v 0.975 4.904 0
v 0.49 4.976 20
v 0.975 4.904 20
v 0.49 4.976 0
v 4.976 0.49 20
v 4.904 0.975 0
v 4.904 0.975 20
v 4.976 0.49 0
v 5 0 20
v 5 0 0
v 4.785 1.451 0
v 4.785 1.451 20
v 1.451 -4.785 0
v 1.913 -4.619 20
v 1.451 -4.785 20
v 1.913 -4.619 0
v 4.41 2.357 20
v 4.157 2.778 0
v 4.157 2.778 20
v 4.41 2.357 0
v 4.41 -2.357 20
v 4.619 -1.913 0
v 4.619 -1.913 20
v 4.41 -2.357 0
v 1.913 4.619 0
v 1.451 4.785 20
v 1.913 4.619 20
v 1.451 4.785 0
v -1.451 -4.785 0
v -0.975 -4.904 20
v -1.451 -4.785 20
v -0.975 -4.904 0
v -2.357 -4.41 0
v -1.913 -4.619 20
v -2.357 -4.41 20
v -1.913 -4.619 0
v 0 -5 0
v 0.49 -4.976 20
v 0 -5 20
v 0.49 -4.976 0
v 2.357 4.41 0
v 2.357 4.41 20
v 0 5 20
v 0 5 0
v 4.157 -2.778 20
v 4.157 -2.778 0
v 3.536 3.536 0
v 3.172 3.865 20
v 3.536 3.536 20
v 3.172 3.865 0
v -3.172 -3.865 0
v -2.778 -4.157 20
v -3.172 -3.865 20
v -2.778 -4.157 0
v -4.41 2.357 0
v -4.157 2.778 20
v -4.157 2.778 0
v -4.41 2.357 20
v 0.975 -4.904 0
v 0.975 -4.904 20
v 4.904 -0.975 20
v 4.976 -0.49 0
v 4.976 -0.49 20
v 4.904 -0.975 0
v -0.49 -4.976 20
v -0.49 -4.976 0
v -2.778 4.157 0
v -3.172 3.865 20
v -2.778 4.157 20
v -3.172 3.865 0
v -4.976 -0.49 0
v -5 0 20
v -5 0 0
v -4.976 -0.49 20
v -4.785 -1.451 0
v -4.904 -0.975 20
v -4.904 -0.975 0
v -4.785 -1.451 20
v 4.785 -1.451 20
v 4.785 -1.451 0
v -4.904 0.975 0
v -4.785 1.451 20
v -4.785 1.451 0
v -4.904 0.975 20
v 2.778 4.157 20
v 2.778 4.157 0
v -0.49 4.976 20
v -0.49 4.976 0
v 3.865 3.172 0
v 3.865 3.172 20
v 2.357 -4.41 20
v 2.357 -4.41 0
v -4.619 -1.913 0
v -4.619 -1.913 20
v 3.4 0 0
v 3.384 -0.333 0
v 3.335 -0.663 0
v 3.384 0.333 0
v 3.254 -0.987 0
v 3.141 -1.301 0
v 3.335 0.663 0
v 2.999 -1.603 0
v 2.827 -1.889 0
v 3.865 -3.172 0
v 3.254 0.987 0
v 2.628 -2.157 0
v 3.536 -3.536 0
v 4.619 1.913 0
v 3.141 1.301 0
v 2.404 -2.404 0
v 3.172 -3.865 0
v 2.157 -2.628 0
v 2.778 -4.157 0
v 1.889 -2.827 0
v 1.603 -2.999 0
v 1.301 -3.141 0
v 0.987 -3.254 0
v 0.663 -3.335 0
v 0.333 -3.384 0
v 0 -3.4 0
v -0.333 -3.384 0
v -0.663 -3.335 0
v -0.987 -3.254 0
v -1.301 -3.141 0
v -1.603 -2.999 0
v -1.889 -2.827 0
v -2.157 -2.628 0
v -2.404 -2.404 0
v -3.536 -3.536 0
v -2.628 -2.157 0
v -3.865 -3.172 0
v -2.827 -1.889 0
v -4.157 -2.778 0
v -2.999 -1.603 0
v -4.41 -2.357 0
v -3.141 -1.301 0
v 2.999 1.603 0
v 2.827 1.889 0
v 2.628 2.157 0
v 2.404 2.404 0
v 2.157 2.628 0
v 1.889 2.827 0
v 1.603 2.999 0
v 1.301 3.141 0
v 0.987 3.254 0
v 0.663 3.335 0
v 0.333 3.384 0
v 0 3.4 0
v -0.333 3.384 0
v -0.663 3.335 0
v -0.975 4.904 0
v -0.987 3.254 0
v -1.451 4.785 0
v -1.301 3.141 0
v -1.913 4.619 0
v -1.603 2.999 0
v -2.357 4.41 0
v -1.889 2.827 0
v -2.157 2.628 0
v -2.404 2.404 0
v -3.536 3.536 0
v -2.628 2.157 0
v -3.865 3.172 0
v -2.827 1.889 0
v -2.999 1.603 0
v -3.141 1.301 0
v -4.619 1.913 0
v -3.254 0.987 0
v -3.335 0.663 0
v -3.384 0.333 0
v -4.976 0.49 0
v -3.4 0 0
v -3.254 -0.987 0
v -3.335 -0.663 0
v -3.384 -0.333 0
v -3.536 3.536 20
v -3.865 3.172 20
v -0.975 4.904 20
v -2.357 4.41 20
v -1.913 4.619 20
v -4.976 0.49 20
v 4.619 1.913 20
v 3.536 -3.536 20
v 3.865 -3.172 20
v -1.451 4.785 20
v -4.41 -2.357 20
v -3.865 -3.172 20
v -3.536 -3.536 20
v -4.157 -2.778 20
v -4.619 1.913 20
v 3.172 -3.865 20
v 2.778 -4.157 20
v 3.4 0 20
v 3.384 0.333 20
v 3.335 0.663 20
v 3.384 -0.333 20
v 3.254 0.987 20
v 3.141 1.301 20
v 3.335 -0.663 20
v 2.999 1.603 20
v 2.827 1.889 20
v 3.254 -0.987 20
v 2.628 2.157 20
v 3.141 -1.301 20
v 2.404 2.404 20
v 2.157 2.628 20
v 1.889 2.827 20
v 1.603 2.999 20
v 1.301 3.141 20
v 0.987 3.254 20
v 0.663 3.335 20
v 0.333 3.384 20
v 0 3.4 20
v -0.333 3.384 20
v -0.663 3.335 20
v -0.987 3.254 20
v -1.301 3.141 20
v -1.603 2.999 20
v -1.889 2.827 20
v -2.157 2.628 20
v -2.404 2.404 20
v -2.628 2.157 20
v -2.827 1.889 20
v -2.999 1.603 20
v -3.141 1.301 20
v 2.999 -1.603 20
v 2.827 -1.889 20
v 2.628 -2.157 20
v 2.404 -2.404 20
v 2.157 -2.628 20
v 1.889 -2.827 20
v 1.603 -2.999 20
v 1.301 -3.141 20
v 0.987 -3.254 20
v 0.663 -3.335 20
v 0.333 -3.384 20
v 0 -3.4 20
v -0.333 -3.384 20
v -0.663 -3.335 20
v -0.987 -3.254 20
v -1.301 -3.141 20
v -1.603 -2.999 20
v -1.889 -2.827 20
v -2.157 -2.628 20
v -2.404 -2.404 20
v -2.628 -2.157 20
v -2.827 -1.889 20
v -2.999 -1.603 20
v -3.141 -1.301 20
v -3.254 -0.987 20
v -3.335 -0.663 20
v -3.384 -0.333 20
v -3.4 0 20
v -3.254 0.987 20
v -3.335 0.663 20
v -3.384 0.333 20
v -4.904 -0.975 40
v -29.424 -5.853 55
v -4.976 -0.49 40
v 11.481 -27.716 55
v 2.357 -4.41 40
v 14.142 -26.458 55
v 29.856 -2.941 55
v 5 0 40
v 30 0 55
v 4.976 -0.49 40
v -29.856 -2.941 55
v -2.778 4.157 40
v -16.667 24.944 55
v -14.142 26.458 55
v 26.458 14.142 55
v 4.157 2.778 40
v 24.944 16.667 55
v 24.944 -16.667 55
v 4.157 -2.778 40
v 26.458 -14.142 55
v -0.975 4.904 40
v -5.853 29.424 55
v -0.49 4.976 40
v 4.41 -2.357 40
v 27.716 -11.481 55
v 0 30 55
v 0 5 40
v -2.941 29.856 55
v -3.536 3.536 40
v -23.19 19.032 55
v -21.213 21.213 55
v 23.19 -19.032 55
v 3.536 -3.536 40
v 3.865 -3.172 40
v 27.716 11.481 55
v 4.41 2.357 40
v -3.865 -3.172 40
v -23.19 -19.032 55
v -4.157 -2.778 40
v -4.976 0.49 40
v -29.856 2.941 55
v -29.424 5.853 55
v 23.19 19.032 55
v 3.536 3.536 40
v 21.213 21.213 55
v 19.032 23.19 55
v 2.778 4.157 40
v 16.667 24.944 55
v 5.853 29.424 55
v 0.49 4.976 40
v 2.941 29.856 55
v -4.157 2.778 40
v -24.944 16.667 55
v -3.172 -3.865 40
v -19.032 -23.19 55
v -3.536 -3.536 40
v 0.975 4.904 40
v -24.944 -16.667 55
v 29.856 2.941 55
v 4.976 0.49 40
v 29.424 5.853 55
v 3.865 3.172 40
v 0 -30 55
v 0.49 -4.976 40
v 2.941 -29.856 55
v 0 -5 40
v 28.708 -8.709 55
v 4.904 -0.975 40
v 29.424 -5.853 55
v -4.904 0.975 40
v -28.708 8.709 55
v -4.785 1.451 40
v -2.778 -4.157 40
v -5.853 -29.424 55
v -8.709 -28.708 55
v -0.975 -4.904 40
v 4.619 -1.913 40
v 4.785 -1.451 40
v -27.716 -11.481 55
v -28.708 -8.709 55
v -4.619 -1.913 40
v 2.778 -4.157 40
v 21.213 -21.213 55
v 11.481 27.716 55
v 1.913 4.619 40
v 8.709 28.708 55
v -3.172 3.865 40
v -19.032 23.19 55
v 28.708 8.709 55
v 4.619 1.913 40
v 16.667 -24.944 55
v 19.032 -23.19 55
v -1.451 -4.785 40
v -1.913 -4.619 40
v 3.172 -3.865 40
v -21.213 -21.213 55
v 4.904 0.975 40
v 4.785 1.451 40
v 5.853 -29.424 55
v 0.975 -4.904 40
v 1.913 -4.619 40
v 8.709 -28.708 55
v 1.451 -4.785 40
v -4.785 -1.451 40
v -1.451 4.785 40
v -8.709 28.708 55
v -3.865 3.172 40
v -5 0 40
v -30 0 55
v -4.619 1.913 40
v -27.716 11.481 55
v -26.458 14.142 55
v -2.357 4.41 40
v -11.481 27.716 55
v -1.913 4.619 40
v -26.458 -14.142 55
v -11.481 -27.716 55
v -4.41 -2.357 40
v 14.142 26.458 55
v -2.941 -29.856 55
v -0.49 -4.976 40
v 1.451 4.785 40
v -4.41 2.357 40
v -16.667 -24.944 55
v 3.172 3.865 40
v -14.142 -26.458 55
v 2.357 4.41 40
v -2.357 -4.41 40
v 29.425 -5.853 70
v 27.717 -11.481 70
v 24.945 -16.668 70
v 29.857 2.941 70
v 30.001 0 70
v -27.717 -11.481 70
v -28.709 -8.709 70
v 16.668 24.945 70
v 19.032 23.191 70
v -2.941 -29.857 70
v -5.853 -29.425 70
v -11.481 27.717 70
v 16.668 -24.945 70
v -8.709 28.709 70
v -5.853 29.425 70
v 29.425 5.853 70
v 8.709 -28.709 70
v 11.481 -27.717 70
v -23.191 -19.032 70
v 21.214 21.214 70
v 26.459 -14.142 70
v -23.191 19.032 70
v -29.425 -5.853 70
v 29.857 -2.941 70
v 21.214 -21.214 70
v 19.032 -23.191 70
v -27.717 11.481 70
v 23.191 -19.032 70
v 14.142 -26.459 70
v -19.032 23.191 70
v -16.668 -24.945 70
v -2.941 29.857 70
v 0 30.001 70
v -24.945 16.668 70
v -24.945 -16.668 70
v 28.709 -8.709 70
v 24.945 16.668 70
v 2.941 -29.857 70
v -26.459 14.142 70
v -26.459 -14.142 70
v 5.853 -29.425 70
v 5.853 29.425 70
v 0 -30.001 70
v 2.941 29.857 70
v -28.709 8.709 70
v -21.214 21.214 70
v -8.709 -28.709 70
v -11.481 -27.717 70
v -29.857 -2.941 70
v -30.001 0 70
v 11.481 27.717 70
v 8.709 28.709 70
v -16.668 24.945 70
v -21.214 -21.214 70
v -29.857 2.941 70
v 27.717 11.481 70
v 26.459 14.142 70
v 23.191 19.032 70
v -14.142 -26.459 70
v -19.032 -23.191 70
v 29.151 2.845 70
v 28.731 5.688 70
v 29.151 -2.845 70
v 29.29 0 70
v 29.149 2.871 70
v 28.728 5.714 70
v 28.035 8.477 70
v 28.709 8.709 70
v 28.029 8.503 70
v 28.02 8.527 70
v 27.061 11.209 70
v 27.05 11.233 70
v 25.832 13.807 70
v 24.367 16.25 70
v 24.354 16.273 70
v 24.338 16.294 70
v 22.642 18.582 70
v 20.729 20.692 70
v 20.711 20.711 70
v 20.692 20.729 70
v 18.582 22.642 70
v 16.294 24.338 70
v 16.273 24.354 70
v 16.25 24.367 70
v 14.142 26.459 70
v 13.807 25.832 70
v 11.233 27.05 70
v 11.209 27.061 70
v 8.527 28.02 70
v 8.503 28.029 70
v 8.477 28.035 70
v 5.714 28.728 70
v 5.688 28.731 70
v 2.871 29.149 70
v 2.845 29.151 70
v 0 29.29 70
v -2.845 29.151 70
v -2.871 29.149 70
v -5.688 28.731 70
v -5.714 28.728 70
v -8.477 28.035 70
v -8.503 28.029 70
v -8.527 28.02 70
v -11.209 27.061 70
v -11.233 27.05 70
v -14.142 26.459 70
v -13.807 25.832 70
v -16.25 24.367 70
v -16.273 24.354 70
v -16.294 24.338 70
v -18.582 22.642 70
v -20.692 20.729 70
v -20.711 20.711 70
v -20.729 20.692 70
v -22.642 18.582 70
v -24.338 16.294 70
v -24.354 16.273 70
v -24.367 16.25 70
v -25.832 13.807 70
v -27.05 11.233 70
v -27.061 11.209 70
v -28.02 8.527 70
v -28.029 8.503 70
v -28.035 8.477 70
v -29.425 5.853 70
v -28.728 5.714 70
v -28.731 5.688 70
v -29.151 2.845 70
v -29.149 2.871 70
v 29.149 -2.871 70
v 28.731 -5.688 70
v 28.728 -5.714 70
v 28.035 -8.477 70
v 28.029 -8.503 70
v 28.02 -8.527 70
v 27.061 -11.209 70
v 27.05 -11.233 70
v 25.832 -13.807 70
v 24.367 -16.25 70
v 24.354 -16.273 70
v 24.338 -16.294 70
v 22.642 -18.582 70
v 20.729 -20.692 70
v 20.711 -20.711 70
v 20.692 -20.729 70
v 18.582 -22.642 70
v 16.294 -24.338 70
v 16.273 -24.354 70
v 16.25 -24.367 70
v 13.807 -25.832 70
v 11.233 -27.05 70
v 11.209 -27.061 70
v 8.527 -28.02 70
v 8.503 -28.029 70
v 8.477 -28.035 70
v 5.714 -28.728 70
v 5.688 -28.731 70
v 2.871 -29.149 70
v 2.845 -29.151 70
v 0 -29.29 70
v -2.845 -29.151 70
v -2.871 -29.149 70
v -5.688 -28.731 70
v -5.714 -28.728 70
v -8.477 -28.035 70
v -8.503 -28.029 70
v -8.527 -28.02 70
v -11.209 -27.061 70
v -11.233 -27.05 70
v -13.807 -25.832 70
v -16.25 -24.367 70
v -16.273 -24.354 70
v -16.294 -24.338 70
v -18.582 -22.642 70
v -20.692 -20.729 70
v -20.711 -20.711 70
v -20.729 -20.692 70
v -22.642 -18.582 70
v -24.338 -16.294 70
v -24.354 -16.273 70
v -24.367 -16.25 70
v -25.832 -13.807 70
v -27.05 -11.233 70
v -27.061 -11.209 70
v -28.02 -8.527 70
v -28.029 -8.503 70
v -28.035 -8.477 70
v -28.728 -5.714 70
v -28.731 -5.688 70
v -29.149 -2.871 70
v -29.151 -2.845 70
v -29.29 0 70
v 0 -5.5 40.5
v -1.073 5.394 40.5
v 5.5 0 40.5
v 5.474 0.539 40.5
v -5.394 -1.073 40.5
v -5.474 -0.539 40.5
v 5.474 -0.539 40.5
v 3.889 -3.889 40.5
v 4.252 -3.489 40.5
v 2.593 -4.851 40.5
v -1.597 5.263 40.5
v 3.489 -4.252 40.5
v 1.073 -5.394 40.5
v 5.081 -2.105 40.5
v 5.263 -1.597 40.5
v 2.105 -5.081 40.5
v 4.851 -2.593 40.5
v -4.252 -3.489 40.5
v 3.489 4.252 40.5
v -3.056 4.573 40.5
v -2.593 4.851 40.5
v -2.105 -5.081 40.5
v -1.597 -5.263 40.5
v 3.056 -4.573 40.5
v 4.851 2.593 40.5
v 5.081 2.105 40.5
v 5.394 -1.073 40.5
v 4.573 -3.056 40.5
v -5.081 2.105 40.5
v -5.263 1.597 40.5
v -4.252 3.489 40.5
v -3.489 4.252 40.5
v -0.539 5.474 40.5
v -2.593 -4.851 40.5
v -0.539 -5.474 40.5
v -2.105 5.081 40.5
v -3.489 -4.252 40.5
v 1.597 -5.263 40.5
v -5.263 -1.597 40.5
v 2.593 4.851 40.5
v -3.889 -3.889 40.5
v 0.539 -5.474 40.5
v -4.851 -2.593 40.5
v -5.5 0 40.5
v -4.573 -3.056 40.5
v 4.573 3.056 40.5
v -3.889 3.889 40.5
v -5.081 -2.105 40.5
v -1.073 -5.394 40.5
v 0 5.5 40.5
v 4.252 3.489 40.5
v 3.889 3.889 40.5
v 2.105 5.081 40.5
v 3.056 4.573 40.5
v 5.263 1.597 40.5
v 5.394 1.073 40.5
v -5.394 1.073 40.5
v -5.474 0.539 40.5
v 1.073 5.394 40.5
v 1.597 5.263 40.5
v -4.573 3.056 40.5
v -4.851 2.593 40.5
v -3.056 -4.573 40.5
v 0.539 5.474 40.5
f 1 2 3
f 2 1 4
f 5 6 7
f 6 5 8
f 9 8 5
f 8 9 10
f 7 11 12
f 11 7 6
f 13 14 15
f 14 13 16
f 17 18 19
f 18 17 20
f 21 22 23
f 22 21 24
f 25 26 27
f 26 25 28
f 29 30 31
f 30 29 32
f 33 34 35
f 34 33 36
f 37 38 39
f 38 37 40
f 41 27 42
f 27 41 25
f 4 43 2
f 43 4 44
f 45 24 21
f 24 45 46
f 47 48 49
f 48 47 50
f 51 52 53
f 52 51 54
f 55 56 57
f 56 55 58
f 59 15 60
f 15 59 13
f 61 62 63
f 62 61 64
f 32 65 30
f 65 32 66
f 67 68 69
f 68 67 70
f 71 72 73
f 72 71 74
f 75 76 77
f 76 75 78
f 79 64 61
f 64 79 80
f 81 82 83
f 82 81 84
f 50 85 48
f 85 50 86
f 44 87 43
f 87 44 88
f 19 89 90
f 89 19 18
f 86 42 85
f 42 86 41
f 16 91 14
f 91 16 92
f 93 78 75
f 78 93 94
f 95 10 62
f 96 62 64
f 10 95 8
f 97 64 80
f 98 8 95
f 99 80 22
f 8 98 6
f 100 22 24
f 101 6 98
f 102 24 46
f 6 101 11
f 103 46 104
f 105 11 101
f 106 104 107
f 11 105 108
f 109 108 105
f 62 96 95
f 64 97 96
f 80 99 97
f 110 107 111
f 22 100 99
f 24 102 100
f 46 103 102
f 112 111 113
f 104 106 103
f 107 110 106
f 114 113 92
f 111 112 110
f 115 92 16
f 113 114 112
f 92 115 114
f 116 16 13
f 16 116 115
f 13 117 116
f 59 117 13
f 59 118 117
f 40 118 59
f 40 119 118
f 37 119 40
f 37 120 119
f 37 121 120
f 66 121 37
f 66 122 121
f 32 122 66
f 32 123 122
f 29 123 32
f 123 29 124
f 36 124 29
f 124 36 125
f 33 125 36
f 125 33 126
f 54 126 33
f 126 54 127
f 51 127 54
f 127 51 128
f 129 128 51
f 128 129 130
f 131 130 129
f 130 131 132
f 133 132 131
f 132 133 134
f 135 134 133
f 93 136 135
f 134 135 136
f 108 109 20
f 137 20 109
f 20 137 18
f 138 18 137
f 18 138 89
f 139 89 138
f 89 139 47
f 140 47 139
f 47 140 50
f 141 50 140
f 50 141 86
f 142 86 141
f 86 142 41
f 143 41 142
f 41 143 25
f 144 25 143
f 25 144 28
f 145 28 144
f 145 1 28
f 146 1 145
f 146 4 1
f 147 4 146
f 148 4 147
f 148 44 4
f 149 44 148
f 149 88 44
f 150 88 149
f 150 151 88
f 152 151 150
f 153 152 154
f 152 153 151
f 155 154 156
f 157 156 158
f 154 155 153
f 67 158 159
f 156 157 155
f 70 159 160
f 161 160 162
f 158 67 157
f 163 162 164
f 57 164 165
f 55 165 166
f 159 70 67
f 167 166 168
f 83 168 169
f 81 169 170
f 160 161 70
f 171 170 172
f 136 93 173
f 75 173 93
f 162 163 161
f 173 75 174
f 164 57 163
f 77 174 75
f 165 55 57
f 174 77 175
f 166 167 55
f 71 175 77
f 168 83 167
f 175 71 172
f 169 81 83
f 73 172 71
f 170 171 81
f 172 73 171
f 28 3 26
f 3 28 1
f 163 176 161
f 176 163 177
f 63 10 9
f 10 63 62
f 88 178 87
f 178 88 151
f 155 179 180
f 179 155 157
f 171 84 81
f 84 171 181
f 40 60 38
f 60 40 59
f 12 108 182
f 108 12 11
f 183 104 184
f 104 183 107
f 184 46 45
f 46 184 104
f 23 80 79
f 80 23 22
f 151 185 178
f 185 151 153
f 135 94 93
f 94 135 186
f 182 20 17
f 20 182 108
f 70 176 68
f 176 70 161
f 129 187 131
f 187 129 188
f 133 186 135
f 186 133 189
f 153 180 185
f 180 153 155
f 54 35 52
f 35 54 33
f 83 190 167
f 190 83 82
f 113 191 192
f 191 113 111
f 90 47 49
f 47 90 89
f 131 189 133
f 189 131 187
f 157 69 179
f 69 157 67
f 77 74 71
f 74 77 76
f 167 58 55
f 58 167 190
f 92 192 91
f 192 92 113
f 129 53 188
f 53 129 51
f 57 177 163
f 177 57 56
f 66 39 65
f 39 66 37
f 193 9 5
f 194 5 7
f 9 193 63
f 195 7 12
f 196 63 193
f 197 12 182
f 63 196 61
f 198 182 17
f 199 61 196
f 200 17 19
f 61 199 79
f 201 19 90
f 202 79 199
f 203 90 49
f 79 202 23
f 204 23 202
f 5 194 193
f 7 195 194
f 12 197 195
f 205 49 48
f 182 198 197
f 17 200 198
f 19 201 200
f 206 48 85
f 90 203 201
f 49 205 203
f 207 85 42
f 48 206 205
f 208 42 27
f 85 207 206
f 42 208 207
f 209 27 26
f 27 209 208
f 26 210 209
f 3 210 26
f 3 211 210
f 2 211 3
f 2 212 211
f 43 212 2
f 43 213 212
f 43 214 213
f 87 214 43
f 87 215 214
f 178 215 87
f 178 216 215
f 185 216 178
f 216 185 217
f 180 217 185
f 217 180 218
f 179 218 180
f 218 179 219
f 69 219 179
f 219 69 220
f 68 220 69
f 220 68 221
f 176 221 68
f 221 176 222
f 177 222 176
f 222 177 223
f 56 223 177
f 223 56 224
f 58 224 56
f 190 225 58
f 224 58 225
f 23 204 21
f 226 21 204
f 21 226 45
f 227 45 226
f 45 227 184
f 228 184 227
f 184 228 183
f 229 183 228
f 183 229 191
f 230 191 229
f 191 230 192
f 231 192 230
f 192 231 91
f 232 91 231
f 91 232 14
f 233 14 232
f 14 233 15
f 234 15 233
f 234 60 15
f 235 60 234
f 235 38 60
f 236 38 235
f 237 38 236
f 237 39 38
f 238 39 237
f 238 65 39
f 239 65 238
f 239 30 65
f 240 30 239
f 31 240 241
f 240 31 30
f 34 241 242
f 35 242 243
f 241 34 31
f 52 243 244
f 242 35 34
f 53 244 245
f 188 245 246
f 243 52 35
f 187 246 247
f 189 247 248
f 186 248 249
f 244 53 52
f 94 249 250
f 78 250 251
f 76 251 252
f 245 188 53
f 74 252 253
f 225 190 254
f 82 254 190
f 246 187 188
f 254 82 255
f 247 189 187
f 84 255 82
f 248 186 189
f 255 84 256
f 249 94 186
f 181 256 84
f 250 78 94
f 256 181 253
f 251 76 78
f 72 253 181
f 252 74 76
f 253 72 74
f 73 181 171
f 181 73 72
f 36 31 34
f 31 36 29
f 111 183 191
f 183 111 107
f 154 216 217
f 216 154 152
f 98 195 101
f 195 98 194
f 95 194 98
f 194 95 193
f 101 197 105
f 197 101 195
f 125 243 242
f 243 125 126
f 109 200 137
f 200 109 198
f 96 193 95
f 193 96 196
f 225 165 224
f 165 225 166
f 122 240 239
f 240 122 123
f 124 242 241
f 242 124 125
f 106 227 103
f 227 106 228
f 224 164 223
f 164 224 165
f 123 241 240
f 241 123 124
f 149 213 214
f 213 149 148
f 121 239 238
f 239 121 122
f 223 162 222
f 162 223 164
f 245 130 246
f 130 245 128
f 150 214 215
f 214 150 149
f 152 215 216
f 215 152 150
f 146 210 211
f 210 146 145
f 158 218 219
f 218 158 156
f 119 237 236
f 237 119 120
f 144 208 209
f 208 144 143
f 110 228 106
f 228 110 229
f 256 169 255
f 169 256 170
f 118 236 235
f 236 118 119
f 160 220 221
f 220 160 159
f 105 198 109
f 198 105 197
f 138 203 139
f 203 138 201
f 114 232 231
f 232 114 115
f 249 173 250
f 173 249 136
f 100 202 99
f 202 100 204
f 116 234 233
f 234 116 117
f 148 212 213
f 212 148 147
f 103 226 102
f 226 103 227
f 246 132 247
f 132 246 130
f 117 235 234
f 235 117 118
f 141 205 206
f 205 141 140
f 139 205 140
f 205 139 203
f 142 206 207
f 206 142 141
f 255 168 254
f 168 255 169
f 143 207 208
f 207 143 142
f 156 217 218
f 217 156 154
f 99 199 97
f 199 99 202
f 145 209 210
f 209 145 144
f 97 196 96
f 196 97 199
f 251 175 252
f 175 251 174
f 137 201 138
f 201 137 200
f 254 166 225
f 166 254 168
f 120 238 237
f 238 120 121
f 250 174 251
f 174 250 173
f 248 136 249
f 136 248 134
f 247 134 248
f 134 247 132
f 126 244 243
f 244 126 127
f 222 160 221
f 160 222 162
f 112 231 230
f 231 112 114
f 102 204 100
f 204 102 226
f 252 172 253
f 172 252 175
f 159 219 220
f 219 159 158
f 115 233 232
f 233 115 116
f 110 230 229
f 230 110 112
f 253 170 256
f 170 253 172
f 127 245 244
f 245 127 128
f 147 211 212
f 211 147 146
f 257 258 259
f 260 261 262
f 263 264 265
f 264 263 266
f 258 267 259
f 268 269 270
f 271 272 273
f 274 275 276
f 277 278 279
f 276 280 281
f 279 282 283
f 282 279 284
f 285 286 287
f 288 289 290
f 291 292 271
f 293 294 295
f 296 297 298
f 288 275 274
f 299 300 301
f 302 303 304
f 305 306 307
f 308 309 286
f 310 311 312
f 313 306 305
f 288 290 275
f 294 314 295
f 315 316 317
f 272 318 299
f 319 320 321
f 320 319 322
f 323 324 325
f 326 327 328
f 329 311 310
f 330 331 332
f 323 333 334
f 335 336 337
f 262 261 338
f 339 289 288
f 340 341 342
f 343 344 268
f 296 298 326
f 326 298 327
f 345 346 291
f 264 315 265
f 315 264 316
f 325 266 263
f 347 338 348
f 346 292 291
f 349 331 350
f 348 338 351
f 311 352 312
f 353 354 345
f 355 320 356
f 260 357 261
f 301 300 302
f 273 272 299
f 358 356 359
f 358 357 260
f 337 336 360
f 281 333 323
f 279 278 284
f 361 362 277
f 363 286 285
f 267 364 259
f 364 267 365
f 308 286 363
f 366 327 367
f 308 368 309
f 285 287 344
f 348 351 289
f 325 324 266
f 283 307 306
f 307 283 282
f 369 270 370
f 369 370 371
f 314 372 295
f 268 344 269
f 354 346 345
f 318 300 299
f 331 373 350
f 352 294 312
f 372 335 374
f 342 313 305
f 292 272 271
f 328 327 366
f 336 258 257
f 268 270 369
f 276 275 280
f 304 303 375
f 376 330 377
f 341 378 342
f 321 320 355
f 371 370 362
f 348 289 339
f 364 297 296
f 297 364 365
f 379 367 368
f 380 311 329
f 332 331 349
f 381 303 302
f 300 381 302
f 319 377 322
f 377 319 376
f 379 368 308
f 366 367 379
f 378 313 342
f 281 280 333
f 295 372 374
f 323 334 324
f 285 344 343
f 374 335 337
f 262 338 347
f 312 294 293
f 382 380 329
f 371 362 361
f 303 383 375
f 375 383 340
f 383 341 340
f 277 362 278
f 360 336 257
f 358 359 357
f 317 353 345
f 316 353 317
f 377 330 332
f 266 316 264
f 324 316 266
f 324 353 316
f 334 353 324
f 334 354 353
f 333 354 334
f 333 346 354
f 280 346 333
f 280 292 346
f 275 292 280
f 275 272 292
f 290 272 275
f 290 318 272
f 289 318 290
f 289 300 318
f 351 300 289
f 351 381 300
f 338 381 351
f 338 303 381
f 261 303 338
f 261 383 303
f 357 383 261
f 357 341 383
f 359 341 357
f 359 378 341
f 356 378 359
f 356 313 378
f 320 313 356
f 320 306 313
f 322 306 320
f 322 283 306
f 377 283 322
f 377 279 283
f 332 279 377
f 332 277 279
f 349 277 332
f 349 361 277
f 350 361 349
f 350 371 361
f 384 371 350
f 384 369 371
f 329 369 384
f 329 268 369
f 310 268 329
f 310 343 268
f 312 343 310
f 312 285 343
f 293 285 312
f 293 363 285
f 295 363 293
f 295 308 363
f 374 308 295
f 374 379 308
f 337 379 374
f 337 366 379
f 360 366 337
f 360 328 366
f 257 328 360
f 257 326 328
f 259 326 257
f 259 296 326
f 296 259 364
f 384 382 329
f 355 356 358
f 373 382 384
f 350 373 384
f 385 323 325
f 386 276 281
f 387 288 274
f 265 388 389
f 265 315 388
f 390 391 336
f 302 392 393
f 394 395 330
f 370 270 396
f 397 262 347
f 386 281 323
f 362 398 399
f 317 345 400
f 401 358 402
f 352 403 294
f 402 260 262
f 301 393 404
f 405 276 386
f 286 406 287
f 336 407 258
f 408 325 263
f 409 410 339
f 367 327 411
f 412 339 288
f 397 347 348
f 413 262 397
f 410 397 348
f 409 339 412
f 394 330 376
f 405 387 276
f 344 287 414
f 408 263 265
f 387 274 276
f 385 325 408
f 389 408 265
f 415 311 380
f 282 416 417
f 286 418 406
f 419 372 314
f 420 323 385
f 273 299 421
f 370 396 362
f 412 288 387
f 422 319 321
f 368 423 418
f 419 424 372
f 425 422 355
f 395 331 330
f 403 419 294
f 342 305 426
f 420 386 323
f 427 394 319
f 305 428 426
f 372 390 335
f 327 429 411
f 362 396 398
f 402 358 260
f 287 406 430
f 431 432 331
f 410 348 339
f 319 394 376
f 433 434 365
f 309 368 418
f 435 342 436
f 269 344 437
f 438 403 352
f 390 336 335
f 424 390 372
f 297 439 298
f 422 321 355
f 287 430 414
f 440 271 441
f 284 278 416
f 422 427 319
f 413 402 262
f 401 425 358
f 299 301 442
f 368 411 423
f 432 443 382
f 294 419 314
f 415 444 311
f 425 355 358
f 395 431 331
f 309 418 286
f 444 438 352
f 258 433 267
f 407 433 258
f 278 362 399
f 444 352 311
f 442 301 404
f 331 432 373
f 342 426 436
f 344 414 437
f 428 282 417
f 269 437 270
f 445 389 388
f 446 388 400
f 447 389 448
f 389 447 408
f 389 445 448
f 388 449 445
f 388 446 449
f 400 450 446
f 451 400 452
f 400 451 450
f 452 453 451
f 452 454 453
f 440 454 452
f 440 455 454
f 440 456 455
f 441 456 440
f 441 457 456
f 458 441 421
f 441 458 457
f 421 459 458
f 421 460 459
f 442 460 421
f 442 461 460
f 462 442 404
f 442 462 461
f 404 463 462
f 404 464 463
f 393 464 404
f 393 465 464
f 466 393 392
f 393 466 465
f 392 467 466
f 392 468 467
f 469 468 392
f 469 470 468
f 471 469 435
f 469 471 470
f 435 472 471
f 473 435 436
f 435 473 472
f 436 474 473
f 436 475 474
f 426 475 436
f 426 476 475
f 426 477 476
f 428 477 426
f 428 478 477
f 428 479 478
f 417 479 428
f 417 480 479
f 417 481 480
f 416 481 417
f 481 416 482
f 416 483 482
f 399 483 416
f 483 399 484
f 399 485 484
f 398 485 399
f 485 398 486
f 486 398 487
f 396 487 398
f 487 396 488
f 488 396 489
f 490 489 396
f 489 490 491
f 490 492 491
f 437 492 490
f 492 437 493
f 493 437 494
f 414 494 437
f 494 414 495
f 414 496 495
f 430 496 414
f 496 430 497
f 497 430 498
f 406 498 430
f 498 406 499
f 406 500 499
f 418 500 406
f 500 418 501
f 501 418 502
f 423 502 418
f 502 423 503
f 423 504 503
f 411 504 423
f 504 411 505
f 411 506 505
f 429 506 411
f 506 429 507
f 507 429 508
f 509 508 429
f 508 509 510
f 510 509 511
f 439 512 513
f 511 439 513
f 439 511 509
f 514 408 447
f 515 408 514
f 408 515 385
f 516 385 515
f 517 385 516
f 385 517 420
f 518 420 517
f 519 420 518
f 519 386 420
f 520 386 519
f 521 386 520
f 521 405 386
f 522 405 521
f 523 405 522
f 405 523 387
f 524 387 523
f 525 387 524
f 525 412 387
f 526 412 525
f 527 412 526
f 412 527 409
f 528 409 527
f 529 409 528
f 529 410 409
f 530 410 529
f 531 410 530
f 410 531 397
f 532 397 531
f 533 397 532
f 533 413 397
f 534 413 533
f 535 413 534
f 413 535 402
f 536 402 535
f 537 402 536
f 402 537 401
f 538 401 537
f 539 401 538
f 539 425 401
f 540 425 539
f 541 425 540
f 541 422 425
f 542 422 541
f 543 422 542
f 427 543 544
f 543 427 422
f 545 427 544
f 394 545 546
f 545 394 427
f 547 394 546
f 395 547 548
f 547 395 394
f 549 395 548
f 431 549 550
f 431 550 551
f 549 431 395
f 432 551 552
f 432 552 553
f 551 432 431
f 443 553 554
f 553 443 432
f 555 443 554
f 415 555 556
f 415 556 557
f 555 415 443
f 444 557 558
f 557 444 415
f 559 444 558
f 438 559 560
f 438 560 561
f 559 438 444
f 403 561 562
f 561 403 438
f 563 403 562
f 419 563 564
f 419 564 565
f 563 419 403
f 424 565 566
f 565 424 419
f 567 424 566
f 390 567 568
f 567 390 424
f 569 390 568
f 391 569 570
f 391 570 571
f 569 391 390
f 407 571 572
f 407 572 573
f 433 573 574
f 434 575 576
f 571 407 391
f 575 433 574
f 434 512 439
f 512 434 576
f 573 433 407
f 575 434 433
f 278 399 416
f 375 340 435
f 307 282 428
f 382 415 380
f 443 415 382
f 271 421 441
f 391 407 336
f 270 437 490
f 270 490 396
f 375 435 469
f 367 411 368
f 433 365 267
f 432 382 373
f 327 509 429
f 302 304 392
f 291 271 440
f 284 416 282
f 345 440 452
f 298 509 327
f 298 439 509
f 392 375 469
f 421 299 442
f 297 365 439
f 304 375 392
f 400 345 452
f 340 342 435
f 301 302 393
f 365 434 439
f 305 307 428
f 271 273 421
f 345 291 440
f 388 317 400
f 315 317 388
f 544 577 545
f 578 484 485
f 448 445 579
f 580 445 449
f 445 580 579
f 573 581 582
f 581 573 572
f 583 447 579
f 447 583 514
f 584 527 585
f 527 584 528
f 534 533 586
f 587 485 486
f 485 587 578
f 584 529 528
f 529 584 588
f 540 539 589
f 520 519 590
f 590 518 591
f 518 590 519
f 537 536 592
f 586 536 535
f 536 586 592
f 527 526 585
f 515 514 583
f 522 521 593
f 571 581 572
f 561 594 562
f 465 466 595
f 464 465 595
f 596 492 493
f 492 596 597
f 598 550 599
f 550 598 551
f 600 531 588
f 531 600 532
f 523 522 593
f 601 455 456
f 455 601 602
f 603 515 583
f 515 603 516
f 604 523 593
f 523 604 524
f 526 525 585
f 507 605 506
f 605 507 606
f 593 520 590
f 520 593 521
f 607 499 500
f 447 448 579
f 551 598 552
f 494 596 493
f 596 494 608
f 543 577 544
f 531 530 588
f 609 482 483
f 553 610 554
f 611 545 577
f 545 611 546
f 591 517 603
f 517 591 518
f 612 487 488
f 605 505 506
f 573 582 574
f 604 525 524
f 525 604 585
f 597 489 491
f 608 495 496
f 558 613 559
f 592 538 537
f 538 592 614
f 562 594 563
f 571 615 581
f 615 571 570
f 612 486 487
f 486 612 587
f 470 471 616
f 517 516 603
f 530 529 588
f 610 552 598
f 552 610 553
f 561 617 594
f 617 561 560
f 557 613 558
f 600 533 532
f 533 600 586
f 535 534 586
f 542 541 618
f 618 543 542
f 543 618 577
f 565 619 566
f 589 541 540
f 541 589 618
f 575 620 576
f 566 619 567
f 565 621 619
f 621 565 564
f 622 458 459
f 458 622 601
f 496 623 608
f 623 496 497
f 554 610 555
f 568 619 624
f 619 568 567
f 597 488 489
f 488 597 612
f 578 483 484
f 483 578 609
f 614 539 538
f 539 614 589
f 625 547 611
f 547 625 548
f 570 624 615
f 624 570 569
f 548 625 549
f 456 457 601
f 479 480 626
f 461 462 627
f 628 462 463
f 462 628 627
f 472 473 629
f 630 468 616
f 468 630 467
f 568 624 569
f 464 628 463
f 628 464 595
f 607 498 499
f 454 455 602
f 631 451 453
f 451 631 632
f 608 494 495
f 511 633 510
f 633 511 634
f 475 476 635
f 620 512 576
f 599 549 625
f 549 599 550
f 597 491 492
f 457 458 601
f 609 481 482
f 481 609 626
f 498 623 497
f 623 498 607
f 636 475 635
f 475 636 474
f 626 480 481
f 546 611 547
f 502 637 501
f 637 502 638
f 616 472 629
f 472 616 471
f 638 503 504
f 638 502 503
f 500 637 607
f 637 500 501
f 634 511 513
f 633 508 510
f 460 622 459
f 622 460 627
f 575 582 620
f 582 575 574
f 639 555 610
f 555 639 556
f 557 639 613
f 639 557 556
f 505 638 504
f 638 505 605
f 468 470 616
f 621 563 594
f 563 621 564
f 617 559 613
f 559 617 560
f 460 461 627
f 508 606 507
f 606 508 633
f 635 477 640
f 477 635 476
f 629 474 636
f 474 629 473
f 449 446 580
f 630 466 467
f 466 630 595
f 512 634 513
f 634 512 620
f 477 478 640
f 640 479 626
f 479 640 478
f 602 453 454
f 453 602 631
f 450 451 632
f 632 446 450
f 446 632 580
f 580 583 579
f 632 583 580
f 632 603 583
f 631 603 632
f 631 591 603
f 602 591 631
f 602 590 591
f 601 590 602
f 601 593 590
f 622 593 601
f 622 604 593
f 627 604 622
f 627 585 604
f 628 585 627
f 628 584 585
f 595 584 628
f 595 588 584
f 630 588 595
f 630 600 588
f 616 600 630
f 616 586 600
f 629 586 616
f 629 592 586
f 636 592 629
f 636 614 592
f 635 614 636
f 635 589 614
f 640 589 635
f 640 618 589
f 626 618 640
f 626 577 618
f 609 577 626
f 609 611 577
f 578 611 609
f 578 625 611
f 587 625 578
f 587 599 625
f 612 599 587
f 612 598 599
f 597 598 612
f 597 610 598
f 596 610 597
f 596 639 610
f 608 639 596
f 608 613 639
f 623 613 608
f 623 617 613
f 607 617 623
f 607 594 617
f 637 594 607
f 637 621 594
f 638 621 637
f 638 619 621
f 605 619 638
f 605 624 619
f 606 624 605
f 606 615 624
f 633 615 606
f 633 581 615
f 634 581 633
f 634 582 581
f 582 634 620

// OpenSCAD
// Lab funnel - printed upright, open at top and bottom
// Units: mm. Wall thickness: 1.6. Spout OD: 10. Cone: 10 -> 60 (z=20..50).

$fn = 64;

// ---- Parameters ----
spout_od      = 10;    // spout outer diameter
spout_h       = 20;    // spout height (z = 0..20)
cone_od_top   = 60;    // cone rim diameter (z = 50)
cone_od_bot   = 10;    // cone base diameter at spout top (z = 20)
cone_h        = 30;    // cone height (z = 20..50)
wall          = 1.6;   // wall thickness everywhere
eps           = 0.5;   // cutter overshoot past faces

// ---- Derived ----
spout_id = spout_od - 2 * wall;   // bore of spout (6.8)
cone_id_top = cone_od_top - 2 * wall; // rim bore (56.8)

// ---- Model ----
union() {
    // Spout tube
    translate([0, 0, 0])
        difference() {
            cylinder(h = spout_h, d = spout_od);
            translate([0, 0, -eps])
                cylinder(h = spout_h + 2 * eps, d = spout_id);
        }

    // Funnel cone (z = 20..50), open at top
    translate([0, 0, spout_h])
        difference() {
            // Frustum: cone_od_bot at z = spout_h down to cone_od_top at z = spout_h + cone_h
            // Build it as two back-to-back cones sharing the base disk.
            union() {
                // Lower cone (z = spout_h .. spout_h + cone_h / 2)
                translate([0, 0, spout_h])
                    rotate([0, 0, 0])
                        cylinder(h = cone_h / 2, r1 = cone_od_bot / 2, r2 = cone_od_top / 2);
                // Upper cone (z = spout_h + cone_h / 2 .. spout_h + cone_h)
                translate([0, 0, spout_h + cone_h / 2])
                    rotate([0, 0, 0])
                        cylinder(h = cone_h / 2, r1 = cone_od_top / 2, r2 = cone_od_top / 2 + 0.001);
            }
            // Bore: same cone, shifted up by eps, so the cut runs from z = spout_h + eps .. spout_h + cone_h + eps
            translate([0, 0, spout_h + eps])
                rotate([0, 0, 0])
                    cylinder(h = cone_h + 1, r1 = cone_od_bot / 2 + eps, r2 = cone_od_top / 2 + eps);
        }
}
